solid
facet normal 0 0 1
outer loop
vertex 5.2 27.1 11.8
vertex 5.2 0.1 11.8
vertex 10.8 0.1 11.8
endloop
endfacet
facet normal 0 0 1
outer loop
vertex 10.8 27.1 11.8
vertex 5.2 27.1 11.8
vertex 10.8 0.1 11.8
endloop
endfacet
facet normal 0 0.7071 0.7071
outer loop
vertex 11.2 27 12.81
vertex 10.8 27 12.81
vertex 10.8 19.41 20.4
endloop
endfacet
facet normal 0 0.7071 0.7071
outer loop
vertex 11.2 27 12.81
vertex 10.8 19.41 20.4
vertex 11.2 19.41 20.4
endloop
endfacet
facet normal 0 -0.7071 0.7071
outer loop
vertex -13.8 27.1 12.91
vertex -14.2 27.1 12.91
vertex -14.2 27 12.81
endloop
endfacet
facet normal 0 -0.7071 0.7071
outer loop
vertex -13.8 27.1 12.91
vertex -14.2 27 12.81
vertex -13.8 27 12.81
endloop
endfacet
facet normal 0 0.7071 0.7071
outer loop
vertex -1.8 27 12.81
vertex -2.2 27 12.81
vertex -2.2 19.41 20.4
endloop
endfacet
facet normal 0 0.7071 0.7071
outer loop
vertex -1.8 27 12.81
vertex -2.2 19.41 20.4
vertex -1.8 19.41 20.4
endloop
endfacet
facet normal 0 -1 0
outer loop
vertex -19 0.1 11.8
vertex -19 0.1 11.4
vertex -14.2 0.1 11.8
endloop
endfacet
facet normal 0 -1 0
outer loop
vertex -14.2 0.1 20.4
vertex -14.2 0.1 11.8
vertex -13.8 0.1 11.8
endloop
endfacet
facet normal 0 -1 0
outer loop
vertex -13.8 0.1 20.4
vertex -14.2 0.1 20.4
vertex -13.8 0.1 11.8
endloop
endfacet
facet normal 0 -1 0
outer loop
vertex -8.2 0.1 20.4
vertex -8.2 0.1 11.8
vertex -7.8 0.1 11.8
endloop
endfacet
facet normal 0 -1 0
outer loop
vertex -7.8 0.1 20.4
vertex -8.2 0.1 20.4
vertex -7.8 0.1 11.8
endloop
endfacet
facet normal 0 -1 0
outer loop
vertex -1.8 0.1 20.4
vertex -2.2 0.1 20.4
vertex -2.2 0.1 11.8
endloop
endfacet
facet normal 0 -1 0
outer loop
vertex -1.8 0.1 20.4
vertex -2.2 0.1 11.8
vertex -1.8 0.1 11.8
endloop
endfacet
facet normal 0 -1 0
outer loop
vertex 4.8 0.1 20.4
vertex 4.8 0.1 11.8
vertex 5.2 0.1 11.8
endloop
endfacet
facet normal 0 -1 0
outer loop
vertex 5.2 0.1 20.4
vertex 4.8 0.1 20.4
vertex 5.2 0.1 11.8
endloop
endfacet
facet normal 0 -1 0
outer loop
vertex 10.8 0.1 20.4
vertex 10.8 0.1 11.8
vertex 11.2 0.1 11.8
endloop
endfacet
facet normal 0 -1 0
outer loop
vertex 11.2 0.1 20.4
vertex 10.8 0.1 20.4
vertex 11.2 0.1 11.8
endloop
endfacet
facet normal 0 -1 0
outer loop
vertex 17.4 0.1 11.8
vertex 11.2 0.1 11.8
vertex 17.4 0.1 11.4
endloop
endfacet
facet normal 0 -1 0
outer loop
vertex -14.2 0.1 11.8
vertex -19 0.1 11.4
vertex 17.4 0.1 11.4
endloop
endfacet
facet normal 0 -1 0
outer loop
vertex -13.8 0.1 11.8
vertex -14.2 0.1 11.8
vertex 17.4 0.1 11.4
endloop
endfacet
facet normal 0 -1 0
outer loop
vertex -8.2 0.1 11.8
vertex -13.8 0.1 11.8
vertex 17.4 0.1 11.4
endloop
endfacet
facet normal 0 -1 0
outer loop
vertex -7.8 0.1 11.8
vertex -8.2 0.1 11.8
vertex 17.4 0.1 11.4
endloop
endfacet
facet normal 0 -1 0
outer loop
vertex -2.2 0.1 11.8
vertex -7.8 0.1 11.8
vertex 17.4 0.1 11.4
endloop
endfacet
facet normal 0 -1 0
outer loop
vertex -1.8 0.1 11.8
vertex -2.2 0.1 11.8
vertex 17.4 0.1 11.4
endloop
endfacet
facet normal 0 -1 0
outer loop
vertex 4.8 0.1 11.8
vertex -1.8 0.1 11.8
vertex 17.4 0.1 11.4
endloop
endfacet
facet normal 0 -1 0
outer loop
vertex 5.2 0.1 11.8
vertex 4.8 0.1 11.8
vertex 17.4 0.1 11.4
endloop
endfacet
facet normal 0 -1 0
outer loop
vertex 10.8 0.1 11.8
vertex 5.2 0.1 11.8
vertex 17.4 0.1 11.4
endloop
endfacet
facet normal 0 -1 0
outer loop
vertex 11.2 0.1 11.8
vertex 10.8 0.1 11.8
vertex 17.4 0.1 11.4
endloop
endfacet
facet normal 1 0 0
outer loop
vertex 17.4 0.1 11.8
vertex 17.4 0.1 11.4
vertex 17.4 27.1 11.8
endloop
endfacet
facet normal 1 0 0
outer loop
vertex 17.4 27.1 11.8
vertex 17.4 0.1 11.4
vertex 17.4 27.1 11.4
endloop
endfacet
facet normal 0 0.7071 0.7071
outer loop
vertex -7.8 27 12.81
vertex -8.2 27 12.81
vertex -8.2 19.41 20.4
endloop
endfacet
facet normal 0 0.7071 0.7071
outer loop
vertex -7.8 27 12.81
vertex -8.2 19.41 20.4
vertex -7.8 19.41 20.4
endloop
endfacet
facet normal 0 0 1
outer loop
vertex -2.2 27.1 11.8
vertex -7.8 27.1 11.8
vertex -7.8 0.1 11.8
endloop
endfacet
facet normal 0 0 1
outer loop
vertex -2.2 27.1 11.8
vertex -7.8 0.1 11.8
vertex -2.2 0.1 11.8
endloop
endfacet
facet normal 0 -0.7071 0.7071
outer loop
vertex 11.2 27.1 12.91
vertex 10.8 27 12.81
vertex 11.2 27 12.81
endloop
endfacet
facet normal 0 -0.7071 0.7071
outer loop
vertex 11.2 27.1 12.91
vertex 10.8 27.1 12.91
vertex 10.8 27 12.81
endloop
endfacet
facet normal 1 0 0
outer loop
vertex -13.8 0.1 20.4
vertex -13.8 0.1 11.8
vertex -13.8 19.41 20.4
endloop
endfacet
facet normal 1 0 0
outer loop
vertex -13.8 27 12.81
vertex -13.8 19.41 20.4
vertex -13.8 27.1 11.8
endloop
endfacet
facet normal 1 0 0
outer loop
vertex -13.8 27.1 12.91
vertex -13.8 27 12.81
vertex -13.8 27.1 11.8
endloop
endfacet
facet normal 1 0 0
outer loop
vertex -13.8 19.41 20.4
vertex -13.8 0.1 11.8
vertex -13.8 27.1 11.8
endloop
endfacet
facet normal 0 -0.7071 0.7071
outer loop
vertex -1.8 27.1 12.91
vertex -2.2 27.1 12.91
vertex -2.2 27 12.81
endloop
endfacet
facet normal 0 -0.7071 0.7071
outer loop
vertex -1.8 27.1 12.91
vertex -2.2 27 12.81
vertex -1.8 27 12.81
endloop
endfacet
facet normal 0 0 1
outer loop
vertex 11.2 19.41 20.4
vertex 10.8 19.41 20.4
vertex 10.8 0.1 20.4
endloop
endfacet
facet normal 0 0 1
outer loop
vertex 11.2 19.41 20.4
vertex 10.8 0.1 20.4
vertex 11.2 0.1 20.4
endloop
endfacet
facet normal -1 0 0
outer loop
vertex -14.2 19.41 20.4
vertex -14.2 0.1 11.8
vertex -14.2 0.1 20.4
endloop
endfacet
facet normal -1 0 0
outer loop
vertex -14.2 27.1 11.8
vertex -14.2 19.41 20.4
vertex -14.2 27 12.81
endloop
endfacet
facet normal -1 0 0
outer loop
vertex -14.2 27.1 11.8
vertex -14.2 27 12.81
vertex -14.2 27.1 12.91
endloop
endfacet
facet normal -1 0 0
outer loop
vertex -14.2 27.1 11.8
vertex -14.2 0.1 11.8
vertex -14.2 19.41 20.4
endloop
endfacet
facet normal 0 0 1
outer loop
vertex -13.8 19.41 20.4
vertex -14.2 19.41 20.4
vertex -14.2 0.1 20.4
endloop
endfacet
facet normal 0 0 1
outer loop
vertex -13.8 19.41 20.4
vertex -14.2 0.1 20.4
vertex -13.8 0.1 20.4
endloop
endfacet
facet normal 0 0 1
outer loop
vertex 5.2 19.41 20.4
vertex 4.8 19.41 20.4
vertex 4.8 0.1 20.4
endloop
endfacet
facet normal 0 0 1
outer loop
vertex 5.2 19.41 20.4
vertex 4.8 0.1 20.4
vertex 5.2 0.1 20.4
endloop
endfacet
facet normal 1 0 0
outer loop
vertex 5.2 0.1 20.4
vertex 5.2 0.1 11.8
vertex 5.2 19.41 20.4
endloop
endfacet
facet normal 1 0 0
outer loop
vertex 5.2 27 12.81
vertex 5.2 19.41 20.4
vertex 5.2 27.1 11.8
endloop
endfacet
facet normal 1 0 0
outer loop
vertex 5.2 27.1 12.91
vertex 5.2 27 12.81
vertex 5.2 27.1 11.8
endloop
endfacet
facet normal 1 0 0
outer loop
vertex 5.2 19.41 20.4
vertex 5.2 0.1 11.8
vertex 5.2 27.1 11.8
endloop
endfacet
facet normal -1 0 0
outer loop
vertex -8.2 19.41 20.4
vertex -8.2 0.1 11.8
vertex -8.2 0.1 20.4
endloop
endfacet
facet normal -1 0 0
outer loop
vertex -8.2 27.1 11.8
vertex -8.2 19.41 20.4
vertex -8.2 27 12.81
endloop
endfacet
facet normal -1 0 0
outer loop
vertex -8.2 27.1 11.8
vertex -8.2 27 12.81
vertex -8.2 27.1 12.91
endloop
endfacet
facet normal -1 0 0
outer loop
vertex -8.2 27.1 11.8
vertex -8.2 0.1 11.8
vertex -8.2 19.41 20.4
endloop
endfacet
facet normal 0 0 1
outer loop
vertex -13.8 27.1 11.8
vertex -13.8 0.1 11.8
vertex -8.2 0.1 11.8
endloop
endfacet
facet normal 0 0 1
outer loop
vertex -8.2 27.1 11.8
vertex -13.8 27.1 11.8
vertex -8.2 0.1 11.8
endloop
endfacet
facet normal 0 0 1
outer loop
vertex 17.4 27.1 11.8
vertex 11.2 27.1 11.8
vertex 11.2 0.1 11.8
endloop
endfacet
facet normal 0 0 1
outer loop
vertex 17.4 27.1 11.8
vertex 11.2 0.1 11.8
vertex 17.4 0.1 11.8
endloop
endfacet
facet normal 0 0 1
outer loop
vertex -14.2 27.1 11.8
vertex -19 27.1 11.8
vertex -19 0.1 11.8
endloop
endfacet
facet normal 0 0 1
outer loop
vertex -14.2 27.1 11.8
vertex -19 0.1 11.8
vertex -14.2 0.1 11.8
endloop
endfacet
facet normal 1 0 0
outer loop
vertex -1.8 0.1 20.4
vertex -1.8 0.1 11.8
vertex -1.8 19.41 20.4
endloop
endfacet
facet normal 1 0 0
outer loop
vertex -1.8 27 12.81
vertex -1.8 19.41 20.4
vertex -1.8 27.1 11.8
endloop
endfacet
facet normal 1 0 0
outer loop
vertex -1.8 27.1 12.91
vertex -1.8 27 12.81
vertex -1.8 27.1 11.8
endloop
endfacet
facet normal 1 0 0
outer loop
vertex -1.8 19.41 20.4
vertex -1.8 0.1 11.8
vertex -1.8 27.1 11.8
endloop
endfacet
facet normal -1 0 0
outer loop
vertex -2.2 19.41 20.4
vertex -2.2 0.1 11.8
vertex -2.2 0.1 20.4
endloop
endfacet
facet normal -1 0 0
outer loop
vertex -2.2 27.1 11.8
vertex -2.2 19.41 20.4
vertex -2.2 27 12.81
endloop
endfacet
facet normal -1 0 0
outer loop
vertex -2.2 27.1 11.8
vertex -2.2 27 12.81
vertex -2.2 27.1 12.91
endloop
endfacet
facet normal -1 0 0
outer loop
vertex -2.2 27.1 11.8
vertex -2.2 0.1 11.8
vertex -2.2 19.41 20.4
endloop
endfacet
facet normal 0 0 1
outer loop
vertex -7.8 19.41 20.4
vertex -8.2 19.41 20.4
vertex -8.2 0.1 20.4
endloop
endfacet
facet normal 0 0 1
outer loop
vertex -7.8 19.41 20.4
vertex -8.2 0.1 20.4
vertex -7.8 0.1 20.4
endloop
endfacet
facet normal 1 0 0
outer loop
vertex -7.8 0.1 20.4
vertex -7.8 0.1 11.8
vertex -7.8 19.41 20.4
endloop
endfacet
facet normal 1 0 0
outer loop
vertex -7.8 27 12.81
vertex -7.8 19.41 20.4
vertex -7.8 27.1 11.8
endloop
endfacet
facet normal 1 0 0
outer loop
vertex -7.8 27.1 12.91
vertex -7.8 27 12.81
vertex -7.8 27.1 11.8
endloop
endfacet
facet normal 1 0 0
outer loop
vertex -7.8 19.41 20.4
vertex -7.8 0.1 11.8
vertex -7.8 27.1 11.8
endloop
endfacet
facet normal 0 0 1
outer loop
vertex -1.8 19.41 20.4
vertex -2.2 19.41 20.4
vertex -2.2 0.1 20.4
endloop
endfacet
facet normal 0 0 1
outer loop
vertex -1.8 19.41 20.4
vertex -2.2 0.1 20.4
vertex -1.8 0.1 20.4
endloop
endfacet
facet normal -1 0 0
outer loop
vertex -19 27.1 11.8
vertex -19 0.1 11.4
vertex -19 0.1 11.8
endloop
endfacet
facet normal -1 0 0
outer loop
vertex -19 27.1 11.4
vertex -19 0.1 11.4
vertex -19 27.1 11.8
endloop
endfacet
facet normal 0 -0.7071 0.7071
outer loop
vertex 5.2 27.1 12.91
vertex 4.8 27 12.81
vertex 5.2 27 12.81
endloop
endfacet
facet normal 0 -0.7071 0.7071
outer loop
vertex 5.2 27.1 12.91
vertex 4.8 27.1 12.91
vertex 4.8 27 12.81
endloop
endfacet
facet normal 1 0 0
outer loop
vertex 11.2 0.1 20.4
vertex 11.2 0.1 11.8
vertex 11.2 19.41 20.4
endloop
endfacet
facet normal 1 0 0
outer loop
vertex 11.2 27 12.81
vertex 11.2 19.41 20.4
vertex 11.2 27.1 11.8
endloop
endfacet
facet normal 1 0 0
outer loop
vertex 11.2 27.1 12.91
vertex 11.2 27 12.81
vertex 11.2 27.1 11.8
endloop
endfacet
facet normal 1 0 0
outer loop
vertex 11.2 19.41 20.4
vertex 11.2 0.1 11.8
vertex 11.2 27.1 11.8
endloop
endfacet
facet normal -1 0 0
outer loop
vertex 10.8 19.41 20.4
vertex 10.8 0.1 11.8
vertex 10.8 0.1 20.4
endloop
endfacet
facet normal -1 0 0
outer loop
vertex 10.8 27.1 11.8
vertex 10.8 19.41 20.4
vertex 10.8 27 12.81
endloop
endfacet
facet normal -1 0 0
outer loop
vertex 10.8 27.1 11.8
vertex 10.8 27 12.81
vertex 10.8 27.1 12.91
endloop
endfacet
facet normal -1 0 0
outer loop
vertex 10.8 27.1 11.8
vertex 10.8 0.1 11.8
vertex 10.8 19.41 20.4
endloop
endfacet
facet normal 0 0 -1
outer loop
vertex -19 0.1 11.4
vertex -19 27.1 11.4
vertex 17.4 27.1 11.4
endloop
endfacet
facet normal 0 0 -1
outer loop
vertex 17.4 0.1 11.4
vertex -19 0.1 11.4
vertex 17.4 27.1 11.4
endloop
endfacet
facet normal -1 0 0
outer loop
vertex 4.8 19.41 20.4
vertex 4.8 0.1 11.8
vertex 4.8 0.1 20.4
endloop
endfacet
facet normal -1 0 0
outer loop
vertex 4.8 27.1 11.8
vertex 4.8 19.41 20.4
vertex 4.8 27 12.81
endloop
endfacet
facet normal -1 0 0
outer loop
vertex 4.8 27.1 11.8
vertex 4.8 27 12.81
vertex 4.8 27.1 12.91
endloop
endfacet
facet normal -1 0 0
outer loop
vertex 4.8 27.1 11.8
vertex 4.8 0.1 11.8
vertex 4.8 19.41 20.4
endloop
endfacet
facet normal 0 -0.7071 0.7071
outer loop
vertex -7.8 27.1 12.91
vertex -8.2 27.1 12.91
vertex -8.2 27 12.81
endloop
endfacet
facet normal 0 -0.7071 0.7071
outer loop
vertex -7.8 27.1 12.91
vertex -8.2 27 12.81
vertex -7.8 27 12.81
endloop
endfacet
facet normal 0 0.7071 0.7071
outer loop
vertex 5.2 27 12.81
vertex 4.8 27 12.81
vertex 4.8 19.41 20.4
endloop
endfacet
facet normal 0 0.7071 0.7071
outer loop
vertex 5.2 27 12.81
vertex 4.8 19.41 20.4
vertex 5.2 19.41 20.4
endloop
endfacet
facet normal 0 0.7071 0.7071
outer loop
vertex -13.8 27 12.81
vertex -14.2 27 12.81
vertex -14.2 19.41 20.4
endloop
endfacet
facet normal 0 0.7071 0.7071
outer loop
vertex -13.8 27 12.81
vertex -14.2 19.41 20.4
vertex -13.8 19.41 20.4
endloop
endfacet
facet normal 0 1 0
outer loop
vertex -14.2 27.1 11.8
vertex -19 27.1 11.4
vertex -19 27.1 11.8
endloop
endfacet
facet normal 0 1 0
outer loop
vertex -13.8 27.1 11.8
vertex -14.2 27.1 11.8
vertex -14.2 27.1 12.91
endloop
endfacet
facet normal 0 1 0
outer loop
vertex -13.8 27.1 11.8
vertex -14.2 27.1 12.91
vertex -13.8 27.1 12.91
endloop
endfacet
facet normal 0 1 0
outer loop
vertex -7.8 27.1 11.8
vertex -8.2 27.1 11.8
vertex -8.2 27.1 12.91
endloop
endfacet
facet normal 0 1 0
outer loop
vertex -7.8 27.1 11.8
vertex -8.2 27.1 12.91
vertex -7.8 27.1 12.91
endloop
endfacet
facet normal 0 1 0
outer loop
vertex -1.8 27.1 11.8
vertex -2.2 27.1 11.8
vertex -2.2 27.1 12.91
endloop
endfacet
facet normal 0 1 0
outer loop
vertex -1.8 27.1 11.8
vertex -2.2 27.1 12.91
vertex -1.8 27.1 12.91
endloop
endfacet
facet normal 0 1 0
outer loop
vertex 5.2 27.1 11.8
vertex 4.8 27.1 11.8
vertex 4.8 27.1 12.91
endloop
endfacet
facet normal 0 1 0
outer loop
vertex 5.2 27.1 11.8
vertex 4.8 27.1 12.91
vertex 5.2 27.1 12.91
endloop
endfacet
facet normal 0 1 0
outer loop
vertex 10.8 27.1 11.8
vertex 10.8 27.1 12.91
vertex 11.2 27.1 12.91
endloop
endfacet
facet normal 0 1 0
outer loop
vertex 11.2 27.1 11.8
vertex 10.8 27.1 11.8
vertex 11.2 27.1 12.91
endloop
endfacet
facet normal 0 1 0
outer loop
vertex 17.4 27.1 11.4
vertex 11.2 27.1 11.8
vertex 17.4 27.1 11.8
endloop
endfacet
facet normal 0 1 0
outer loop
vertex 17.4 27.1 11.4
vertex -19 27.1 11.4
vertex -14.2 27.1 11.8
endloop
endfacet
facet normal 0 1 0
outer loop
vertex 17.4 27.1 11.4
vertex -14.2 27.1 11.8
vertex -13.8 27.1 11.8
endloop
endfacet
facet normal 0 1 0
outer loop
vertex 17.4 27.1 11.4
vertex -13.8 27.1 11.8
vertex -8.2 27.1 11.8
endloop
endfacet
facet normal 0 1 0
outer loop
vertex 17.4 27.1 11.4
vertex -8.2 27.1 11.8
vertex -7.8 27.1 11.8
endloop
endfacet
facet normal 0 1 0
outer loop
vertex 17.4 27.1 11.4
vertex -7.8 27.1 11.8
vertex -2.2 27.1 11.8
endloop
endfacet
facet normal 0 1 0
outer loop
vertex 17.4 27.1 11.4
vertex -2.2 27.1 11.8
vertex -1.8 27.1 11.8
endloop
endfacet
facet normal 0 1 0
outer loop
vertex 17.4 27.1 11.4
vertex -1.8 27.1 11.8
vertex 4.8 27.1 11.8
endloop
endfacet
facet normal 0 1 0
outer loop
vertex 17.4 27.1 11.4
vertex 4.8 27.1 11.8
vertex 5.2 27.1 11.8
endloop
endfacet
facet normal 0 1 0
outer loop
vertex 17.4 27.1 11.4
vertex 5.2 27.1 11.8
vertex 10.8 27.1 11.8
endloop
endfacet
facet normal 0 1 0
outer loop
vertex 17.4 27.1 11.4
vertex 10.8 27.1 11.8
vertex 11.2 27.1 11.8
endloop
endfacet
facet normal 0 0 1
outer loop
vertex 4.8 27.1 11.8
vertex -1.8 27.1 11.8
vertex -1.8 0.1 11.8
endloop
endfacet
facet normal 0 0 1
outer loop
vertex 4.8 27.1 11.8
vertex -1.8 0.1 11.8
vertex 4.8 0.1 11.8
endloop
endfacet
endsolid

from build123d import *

# Parameters (mm, degrees)
BOX028_W          = 41.4
BOX028_H          = 10
BOX028_DEPTH      = 11
BOX028_ROLL_ANGLE = 45
BOX037_W          = 0.4
BOX037_H          = 27
BOX037_DEPTH      = 9
BOX036_W          = 0.4
BOX036_H          = 27
BOX036_DEPTH      = 9
BOX035_W          = 0.4
BOX035_H          = 27
BOX035_DEPTH      = 9
BOX034_W          = 0.4
BOX034_H          = 27
BOX034_DEPTH      = 9
BOX038_W          = 0.4
BOX038_H          = 27
BOX038_DEPTH      = 9
BOX033_W          = 36.4
BOX033_H          = 27
BOX033_DEPTH      = 0.4


with BuildPart() as rear_panel_chamfer:
    # Box028 → Box028 (new body)
    with BuildSketch(Plane.XY):
        with Locations((20.7, 5)):
            Rectangle(BOX028_W, BOX028_H)
    extrude(amount=BOX028_DEPTH)


with BuildPart() as rear_panel_chamfer_1:
    # Box028 roll: moved
    add(rear_panel_chamfer.part.rotate(Axis((0, 0, 0), (1, 0, 0)), BOX028_ROLL_ANGLE))


with BuildPart() as rear_panel_chamfer_2:
    # Box028 placement: moved
    add(rear_panel_chamfer_1.part.moved(Location((-21.6, 27, 12.81))))


with BuildPart() as support_y4_for_rear_panel_angled:
    # Box037 → Box037 (new body)
    with BuildSketch(Plane(origin=(-2.2, 0.1, 11.4), x_dir=(1, 0, 0), z_dir=(0, 0, 1))):
        with Locations((0.2, 13.5)):
            Rectangle(BOX037_W, BOX037_H)
    extrude(amount=BOX037_DEPTH)


with BuildPart() as support_y3_for_rear_panel_angled:
    # Box036 → Box036 (new body)
    with BuildSketch(Plane(origin=(4.8, 0.1, 11.4), x_dir=(1, 0, 0), z_dir=(0, 0, 1))):
        with Locations((0.2, 13.5)):
            Rectangle(BOX036_W, BOX036_H)
    extrude(amount=BOX036_DEPTH)


with BuildPart() as support_y2_for_rear_panel_angled:
    # Box035 → Box035 (new body)
    with BuildSketch(Plane(origin=(-8.2, 0.1, 11.4), x_dir=(1, 0, 0), z_dir=(0, 0, 1))):
        with Locations((0.2, 13.5)):
            Rectangle(BOX035_W, BOX035_H)
    extrude(amount=BOX035_DEPTH)


with BuildPart() as support_y1_for_rear_panel_angled:
    # Box034 → Box034 (new body)
    with BuildSketch(Plane(origin=(-14.2, 0.1, 11.4), x_dir=(1, 0, 0), z_dir=(0, 0, 1))):
        with Locations((0.2, 13.5)):
            Rectangle(BOX034_W, BOX034_H)
    extrude(amount=BOX034_DEPTH)


with BuildPart() as support_y5_for_rear_panel_angled:
    # Box038 → Box038 (new body)
    with BuildSketch(Plane(origin=(10.8, 0.1, 11.4), x_dir=(1, 0, 0), z_dir=(0, 0, 1))):
        with Locations((0.2, 13.5)):
            Rectangle(BOX038_W, BOX038_H)
    extrude(amount=BOX038_DEPTH)


with BuildPart() as supports_for_rear_panel_angled_chamfered:
    # Box033 → Box033 (new body)
    with BuildSketch(Plane(origin=(-19, 0.1, 11.4), x_dir=(1, 0, 0), z_dir=(0, 0, 1))):
        with Locations((18.2, 13.5)):
            Rectangle(BOX033_W, BOX033_H)
    extrude(amount=BOX033_DEPTH)

    # Fusion005: union support Y4 for rear panel angled, support Y3 for rear panel angled, support Y2 for rear panel angled, support Y1 for rear panel angled, support Y5 for rear panel angled
    add(support_y4_for_rear_panel_angled.part)
    add(support_y3_for_rear_panel_angled.part)
    add(support_y2_for_rear_panel_angled.part)
    add(support_y1_for_rear_panel_angled.part)
    add(support_y5_for_rear_panel_angled.part)

    # Cut006: cut Rear panel chamfer
    add(rear_panel_chamfer_2.part, mode=Mode.SUBTRACT)


solid = supports_for_rear_panel_angled_chamfered.part
